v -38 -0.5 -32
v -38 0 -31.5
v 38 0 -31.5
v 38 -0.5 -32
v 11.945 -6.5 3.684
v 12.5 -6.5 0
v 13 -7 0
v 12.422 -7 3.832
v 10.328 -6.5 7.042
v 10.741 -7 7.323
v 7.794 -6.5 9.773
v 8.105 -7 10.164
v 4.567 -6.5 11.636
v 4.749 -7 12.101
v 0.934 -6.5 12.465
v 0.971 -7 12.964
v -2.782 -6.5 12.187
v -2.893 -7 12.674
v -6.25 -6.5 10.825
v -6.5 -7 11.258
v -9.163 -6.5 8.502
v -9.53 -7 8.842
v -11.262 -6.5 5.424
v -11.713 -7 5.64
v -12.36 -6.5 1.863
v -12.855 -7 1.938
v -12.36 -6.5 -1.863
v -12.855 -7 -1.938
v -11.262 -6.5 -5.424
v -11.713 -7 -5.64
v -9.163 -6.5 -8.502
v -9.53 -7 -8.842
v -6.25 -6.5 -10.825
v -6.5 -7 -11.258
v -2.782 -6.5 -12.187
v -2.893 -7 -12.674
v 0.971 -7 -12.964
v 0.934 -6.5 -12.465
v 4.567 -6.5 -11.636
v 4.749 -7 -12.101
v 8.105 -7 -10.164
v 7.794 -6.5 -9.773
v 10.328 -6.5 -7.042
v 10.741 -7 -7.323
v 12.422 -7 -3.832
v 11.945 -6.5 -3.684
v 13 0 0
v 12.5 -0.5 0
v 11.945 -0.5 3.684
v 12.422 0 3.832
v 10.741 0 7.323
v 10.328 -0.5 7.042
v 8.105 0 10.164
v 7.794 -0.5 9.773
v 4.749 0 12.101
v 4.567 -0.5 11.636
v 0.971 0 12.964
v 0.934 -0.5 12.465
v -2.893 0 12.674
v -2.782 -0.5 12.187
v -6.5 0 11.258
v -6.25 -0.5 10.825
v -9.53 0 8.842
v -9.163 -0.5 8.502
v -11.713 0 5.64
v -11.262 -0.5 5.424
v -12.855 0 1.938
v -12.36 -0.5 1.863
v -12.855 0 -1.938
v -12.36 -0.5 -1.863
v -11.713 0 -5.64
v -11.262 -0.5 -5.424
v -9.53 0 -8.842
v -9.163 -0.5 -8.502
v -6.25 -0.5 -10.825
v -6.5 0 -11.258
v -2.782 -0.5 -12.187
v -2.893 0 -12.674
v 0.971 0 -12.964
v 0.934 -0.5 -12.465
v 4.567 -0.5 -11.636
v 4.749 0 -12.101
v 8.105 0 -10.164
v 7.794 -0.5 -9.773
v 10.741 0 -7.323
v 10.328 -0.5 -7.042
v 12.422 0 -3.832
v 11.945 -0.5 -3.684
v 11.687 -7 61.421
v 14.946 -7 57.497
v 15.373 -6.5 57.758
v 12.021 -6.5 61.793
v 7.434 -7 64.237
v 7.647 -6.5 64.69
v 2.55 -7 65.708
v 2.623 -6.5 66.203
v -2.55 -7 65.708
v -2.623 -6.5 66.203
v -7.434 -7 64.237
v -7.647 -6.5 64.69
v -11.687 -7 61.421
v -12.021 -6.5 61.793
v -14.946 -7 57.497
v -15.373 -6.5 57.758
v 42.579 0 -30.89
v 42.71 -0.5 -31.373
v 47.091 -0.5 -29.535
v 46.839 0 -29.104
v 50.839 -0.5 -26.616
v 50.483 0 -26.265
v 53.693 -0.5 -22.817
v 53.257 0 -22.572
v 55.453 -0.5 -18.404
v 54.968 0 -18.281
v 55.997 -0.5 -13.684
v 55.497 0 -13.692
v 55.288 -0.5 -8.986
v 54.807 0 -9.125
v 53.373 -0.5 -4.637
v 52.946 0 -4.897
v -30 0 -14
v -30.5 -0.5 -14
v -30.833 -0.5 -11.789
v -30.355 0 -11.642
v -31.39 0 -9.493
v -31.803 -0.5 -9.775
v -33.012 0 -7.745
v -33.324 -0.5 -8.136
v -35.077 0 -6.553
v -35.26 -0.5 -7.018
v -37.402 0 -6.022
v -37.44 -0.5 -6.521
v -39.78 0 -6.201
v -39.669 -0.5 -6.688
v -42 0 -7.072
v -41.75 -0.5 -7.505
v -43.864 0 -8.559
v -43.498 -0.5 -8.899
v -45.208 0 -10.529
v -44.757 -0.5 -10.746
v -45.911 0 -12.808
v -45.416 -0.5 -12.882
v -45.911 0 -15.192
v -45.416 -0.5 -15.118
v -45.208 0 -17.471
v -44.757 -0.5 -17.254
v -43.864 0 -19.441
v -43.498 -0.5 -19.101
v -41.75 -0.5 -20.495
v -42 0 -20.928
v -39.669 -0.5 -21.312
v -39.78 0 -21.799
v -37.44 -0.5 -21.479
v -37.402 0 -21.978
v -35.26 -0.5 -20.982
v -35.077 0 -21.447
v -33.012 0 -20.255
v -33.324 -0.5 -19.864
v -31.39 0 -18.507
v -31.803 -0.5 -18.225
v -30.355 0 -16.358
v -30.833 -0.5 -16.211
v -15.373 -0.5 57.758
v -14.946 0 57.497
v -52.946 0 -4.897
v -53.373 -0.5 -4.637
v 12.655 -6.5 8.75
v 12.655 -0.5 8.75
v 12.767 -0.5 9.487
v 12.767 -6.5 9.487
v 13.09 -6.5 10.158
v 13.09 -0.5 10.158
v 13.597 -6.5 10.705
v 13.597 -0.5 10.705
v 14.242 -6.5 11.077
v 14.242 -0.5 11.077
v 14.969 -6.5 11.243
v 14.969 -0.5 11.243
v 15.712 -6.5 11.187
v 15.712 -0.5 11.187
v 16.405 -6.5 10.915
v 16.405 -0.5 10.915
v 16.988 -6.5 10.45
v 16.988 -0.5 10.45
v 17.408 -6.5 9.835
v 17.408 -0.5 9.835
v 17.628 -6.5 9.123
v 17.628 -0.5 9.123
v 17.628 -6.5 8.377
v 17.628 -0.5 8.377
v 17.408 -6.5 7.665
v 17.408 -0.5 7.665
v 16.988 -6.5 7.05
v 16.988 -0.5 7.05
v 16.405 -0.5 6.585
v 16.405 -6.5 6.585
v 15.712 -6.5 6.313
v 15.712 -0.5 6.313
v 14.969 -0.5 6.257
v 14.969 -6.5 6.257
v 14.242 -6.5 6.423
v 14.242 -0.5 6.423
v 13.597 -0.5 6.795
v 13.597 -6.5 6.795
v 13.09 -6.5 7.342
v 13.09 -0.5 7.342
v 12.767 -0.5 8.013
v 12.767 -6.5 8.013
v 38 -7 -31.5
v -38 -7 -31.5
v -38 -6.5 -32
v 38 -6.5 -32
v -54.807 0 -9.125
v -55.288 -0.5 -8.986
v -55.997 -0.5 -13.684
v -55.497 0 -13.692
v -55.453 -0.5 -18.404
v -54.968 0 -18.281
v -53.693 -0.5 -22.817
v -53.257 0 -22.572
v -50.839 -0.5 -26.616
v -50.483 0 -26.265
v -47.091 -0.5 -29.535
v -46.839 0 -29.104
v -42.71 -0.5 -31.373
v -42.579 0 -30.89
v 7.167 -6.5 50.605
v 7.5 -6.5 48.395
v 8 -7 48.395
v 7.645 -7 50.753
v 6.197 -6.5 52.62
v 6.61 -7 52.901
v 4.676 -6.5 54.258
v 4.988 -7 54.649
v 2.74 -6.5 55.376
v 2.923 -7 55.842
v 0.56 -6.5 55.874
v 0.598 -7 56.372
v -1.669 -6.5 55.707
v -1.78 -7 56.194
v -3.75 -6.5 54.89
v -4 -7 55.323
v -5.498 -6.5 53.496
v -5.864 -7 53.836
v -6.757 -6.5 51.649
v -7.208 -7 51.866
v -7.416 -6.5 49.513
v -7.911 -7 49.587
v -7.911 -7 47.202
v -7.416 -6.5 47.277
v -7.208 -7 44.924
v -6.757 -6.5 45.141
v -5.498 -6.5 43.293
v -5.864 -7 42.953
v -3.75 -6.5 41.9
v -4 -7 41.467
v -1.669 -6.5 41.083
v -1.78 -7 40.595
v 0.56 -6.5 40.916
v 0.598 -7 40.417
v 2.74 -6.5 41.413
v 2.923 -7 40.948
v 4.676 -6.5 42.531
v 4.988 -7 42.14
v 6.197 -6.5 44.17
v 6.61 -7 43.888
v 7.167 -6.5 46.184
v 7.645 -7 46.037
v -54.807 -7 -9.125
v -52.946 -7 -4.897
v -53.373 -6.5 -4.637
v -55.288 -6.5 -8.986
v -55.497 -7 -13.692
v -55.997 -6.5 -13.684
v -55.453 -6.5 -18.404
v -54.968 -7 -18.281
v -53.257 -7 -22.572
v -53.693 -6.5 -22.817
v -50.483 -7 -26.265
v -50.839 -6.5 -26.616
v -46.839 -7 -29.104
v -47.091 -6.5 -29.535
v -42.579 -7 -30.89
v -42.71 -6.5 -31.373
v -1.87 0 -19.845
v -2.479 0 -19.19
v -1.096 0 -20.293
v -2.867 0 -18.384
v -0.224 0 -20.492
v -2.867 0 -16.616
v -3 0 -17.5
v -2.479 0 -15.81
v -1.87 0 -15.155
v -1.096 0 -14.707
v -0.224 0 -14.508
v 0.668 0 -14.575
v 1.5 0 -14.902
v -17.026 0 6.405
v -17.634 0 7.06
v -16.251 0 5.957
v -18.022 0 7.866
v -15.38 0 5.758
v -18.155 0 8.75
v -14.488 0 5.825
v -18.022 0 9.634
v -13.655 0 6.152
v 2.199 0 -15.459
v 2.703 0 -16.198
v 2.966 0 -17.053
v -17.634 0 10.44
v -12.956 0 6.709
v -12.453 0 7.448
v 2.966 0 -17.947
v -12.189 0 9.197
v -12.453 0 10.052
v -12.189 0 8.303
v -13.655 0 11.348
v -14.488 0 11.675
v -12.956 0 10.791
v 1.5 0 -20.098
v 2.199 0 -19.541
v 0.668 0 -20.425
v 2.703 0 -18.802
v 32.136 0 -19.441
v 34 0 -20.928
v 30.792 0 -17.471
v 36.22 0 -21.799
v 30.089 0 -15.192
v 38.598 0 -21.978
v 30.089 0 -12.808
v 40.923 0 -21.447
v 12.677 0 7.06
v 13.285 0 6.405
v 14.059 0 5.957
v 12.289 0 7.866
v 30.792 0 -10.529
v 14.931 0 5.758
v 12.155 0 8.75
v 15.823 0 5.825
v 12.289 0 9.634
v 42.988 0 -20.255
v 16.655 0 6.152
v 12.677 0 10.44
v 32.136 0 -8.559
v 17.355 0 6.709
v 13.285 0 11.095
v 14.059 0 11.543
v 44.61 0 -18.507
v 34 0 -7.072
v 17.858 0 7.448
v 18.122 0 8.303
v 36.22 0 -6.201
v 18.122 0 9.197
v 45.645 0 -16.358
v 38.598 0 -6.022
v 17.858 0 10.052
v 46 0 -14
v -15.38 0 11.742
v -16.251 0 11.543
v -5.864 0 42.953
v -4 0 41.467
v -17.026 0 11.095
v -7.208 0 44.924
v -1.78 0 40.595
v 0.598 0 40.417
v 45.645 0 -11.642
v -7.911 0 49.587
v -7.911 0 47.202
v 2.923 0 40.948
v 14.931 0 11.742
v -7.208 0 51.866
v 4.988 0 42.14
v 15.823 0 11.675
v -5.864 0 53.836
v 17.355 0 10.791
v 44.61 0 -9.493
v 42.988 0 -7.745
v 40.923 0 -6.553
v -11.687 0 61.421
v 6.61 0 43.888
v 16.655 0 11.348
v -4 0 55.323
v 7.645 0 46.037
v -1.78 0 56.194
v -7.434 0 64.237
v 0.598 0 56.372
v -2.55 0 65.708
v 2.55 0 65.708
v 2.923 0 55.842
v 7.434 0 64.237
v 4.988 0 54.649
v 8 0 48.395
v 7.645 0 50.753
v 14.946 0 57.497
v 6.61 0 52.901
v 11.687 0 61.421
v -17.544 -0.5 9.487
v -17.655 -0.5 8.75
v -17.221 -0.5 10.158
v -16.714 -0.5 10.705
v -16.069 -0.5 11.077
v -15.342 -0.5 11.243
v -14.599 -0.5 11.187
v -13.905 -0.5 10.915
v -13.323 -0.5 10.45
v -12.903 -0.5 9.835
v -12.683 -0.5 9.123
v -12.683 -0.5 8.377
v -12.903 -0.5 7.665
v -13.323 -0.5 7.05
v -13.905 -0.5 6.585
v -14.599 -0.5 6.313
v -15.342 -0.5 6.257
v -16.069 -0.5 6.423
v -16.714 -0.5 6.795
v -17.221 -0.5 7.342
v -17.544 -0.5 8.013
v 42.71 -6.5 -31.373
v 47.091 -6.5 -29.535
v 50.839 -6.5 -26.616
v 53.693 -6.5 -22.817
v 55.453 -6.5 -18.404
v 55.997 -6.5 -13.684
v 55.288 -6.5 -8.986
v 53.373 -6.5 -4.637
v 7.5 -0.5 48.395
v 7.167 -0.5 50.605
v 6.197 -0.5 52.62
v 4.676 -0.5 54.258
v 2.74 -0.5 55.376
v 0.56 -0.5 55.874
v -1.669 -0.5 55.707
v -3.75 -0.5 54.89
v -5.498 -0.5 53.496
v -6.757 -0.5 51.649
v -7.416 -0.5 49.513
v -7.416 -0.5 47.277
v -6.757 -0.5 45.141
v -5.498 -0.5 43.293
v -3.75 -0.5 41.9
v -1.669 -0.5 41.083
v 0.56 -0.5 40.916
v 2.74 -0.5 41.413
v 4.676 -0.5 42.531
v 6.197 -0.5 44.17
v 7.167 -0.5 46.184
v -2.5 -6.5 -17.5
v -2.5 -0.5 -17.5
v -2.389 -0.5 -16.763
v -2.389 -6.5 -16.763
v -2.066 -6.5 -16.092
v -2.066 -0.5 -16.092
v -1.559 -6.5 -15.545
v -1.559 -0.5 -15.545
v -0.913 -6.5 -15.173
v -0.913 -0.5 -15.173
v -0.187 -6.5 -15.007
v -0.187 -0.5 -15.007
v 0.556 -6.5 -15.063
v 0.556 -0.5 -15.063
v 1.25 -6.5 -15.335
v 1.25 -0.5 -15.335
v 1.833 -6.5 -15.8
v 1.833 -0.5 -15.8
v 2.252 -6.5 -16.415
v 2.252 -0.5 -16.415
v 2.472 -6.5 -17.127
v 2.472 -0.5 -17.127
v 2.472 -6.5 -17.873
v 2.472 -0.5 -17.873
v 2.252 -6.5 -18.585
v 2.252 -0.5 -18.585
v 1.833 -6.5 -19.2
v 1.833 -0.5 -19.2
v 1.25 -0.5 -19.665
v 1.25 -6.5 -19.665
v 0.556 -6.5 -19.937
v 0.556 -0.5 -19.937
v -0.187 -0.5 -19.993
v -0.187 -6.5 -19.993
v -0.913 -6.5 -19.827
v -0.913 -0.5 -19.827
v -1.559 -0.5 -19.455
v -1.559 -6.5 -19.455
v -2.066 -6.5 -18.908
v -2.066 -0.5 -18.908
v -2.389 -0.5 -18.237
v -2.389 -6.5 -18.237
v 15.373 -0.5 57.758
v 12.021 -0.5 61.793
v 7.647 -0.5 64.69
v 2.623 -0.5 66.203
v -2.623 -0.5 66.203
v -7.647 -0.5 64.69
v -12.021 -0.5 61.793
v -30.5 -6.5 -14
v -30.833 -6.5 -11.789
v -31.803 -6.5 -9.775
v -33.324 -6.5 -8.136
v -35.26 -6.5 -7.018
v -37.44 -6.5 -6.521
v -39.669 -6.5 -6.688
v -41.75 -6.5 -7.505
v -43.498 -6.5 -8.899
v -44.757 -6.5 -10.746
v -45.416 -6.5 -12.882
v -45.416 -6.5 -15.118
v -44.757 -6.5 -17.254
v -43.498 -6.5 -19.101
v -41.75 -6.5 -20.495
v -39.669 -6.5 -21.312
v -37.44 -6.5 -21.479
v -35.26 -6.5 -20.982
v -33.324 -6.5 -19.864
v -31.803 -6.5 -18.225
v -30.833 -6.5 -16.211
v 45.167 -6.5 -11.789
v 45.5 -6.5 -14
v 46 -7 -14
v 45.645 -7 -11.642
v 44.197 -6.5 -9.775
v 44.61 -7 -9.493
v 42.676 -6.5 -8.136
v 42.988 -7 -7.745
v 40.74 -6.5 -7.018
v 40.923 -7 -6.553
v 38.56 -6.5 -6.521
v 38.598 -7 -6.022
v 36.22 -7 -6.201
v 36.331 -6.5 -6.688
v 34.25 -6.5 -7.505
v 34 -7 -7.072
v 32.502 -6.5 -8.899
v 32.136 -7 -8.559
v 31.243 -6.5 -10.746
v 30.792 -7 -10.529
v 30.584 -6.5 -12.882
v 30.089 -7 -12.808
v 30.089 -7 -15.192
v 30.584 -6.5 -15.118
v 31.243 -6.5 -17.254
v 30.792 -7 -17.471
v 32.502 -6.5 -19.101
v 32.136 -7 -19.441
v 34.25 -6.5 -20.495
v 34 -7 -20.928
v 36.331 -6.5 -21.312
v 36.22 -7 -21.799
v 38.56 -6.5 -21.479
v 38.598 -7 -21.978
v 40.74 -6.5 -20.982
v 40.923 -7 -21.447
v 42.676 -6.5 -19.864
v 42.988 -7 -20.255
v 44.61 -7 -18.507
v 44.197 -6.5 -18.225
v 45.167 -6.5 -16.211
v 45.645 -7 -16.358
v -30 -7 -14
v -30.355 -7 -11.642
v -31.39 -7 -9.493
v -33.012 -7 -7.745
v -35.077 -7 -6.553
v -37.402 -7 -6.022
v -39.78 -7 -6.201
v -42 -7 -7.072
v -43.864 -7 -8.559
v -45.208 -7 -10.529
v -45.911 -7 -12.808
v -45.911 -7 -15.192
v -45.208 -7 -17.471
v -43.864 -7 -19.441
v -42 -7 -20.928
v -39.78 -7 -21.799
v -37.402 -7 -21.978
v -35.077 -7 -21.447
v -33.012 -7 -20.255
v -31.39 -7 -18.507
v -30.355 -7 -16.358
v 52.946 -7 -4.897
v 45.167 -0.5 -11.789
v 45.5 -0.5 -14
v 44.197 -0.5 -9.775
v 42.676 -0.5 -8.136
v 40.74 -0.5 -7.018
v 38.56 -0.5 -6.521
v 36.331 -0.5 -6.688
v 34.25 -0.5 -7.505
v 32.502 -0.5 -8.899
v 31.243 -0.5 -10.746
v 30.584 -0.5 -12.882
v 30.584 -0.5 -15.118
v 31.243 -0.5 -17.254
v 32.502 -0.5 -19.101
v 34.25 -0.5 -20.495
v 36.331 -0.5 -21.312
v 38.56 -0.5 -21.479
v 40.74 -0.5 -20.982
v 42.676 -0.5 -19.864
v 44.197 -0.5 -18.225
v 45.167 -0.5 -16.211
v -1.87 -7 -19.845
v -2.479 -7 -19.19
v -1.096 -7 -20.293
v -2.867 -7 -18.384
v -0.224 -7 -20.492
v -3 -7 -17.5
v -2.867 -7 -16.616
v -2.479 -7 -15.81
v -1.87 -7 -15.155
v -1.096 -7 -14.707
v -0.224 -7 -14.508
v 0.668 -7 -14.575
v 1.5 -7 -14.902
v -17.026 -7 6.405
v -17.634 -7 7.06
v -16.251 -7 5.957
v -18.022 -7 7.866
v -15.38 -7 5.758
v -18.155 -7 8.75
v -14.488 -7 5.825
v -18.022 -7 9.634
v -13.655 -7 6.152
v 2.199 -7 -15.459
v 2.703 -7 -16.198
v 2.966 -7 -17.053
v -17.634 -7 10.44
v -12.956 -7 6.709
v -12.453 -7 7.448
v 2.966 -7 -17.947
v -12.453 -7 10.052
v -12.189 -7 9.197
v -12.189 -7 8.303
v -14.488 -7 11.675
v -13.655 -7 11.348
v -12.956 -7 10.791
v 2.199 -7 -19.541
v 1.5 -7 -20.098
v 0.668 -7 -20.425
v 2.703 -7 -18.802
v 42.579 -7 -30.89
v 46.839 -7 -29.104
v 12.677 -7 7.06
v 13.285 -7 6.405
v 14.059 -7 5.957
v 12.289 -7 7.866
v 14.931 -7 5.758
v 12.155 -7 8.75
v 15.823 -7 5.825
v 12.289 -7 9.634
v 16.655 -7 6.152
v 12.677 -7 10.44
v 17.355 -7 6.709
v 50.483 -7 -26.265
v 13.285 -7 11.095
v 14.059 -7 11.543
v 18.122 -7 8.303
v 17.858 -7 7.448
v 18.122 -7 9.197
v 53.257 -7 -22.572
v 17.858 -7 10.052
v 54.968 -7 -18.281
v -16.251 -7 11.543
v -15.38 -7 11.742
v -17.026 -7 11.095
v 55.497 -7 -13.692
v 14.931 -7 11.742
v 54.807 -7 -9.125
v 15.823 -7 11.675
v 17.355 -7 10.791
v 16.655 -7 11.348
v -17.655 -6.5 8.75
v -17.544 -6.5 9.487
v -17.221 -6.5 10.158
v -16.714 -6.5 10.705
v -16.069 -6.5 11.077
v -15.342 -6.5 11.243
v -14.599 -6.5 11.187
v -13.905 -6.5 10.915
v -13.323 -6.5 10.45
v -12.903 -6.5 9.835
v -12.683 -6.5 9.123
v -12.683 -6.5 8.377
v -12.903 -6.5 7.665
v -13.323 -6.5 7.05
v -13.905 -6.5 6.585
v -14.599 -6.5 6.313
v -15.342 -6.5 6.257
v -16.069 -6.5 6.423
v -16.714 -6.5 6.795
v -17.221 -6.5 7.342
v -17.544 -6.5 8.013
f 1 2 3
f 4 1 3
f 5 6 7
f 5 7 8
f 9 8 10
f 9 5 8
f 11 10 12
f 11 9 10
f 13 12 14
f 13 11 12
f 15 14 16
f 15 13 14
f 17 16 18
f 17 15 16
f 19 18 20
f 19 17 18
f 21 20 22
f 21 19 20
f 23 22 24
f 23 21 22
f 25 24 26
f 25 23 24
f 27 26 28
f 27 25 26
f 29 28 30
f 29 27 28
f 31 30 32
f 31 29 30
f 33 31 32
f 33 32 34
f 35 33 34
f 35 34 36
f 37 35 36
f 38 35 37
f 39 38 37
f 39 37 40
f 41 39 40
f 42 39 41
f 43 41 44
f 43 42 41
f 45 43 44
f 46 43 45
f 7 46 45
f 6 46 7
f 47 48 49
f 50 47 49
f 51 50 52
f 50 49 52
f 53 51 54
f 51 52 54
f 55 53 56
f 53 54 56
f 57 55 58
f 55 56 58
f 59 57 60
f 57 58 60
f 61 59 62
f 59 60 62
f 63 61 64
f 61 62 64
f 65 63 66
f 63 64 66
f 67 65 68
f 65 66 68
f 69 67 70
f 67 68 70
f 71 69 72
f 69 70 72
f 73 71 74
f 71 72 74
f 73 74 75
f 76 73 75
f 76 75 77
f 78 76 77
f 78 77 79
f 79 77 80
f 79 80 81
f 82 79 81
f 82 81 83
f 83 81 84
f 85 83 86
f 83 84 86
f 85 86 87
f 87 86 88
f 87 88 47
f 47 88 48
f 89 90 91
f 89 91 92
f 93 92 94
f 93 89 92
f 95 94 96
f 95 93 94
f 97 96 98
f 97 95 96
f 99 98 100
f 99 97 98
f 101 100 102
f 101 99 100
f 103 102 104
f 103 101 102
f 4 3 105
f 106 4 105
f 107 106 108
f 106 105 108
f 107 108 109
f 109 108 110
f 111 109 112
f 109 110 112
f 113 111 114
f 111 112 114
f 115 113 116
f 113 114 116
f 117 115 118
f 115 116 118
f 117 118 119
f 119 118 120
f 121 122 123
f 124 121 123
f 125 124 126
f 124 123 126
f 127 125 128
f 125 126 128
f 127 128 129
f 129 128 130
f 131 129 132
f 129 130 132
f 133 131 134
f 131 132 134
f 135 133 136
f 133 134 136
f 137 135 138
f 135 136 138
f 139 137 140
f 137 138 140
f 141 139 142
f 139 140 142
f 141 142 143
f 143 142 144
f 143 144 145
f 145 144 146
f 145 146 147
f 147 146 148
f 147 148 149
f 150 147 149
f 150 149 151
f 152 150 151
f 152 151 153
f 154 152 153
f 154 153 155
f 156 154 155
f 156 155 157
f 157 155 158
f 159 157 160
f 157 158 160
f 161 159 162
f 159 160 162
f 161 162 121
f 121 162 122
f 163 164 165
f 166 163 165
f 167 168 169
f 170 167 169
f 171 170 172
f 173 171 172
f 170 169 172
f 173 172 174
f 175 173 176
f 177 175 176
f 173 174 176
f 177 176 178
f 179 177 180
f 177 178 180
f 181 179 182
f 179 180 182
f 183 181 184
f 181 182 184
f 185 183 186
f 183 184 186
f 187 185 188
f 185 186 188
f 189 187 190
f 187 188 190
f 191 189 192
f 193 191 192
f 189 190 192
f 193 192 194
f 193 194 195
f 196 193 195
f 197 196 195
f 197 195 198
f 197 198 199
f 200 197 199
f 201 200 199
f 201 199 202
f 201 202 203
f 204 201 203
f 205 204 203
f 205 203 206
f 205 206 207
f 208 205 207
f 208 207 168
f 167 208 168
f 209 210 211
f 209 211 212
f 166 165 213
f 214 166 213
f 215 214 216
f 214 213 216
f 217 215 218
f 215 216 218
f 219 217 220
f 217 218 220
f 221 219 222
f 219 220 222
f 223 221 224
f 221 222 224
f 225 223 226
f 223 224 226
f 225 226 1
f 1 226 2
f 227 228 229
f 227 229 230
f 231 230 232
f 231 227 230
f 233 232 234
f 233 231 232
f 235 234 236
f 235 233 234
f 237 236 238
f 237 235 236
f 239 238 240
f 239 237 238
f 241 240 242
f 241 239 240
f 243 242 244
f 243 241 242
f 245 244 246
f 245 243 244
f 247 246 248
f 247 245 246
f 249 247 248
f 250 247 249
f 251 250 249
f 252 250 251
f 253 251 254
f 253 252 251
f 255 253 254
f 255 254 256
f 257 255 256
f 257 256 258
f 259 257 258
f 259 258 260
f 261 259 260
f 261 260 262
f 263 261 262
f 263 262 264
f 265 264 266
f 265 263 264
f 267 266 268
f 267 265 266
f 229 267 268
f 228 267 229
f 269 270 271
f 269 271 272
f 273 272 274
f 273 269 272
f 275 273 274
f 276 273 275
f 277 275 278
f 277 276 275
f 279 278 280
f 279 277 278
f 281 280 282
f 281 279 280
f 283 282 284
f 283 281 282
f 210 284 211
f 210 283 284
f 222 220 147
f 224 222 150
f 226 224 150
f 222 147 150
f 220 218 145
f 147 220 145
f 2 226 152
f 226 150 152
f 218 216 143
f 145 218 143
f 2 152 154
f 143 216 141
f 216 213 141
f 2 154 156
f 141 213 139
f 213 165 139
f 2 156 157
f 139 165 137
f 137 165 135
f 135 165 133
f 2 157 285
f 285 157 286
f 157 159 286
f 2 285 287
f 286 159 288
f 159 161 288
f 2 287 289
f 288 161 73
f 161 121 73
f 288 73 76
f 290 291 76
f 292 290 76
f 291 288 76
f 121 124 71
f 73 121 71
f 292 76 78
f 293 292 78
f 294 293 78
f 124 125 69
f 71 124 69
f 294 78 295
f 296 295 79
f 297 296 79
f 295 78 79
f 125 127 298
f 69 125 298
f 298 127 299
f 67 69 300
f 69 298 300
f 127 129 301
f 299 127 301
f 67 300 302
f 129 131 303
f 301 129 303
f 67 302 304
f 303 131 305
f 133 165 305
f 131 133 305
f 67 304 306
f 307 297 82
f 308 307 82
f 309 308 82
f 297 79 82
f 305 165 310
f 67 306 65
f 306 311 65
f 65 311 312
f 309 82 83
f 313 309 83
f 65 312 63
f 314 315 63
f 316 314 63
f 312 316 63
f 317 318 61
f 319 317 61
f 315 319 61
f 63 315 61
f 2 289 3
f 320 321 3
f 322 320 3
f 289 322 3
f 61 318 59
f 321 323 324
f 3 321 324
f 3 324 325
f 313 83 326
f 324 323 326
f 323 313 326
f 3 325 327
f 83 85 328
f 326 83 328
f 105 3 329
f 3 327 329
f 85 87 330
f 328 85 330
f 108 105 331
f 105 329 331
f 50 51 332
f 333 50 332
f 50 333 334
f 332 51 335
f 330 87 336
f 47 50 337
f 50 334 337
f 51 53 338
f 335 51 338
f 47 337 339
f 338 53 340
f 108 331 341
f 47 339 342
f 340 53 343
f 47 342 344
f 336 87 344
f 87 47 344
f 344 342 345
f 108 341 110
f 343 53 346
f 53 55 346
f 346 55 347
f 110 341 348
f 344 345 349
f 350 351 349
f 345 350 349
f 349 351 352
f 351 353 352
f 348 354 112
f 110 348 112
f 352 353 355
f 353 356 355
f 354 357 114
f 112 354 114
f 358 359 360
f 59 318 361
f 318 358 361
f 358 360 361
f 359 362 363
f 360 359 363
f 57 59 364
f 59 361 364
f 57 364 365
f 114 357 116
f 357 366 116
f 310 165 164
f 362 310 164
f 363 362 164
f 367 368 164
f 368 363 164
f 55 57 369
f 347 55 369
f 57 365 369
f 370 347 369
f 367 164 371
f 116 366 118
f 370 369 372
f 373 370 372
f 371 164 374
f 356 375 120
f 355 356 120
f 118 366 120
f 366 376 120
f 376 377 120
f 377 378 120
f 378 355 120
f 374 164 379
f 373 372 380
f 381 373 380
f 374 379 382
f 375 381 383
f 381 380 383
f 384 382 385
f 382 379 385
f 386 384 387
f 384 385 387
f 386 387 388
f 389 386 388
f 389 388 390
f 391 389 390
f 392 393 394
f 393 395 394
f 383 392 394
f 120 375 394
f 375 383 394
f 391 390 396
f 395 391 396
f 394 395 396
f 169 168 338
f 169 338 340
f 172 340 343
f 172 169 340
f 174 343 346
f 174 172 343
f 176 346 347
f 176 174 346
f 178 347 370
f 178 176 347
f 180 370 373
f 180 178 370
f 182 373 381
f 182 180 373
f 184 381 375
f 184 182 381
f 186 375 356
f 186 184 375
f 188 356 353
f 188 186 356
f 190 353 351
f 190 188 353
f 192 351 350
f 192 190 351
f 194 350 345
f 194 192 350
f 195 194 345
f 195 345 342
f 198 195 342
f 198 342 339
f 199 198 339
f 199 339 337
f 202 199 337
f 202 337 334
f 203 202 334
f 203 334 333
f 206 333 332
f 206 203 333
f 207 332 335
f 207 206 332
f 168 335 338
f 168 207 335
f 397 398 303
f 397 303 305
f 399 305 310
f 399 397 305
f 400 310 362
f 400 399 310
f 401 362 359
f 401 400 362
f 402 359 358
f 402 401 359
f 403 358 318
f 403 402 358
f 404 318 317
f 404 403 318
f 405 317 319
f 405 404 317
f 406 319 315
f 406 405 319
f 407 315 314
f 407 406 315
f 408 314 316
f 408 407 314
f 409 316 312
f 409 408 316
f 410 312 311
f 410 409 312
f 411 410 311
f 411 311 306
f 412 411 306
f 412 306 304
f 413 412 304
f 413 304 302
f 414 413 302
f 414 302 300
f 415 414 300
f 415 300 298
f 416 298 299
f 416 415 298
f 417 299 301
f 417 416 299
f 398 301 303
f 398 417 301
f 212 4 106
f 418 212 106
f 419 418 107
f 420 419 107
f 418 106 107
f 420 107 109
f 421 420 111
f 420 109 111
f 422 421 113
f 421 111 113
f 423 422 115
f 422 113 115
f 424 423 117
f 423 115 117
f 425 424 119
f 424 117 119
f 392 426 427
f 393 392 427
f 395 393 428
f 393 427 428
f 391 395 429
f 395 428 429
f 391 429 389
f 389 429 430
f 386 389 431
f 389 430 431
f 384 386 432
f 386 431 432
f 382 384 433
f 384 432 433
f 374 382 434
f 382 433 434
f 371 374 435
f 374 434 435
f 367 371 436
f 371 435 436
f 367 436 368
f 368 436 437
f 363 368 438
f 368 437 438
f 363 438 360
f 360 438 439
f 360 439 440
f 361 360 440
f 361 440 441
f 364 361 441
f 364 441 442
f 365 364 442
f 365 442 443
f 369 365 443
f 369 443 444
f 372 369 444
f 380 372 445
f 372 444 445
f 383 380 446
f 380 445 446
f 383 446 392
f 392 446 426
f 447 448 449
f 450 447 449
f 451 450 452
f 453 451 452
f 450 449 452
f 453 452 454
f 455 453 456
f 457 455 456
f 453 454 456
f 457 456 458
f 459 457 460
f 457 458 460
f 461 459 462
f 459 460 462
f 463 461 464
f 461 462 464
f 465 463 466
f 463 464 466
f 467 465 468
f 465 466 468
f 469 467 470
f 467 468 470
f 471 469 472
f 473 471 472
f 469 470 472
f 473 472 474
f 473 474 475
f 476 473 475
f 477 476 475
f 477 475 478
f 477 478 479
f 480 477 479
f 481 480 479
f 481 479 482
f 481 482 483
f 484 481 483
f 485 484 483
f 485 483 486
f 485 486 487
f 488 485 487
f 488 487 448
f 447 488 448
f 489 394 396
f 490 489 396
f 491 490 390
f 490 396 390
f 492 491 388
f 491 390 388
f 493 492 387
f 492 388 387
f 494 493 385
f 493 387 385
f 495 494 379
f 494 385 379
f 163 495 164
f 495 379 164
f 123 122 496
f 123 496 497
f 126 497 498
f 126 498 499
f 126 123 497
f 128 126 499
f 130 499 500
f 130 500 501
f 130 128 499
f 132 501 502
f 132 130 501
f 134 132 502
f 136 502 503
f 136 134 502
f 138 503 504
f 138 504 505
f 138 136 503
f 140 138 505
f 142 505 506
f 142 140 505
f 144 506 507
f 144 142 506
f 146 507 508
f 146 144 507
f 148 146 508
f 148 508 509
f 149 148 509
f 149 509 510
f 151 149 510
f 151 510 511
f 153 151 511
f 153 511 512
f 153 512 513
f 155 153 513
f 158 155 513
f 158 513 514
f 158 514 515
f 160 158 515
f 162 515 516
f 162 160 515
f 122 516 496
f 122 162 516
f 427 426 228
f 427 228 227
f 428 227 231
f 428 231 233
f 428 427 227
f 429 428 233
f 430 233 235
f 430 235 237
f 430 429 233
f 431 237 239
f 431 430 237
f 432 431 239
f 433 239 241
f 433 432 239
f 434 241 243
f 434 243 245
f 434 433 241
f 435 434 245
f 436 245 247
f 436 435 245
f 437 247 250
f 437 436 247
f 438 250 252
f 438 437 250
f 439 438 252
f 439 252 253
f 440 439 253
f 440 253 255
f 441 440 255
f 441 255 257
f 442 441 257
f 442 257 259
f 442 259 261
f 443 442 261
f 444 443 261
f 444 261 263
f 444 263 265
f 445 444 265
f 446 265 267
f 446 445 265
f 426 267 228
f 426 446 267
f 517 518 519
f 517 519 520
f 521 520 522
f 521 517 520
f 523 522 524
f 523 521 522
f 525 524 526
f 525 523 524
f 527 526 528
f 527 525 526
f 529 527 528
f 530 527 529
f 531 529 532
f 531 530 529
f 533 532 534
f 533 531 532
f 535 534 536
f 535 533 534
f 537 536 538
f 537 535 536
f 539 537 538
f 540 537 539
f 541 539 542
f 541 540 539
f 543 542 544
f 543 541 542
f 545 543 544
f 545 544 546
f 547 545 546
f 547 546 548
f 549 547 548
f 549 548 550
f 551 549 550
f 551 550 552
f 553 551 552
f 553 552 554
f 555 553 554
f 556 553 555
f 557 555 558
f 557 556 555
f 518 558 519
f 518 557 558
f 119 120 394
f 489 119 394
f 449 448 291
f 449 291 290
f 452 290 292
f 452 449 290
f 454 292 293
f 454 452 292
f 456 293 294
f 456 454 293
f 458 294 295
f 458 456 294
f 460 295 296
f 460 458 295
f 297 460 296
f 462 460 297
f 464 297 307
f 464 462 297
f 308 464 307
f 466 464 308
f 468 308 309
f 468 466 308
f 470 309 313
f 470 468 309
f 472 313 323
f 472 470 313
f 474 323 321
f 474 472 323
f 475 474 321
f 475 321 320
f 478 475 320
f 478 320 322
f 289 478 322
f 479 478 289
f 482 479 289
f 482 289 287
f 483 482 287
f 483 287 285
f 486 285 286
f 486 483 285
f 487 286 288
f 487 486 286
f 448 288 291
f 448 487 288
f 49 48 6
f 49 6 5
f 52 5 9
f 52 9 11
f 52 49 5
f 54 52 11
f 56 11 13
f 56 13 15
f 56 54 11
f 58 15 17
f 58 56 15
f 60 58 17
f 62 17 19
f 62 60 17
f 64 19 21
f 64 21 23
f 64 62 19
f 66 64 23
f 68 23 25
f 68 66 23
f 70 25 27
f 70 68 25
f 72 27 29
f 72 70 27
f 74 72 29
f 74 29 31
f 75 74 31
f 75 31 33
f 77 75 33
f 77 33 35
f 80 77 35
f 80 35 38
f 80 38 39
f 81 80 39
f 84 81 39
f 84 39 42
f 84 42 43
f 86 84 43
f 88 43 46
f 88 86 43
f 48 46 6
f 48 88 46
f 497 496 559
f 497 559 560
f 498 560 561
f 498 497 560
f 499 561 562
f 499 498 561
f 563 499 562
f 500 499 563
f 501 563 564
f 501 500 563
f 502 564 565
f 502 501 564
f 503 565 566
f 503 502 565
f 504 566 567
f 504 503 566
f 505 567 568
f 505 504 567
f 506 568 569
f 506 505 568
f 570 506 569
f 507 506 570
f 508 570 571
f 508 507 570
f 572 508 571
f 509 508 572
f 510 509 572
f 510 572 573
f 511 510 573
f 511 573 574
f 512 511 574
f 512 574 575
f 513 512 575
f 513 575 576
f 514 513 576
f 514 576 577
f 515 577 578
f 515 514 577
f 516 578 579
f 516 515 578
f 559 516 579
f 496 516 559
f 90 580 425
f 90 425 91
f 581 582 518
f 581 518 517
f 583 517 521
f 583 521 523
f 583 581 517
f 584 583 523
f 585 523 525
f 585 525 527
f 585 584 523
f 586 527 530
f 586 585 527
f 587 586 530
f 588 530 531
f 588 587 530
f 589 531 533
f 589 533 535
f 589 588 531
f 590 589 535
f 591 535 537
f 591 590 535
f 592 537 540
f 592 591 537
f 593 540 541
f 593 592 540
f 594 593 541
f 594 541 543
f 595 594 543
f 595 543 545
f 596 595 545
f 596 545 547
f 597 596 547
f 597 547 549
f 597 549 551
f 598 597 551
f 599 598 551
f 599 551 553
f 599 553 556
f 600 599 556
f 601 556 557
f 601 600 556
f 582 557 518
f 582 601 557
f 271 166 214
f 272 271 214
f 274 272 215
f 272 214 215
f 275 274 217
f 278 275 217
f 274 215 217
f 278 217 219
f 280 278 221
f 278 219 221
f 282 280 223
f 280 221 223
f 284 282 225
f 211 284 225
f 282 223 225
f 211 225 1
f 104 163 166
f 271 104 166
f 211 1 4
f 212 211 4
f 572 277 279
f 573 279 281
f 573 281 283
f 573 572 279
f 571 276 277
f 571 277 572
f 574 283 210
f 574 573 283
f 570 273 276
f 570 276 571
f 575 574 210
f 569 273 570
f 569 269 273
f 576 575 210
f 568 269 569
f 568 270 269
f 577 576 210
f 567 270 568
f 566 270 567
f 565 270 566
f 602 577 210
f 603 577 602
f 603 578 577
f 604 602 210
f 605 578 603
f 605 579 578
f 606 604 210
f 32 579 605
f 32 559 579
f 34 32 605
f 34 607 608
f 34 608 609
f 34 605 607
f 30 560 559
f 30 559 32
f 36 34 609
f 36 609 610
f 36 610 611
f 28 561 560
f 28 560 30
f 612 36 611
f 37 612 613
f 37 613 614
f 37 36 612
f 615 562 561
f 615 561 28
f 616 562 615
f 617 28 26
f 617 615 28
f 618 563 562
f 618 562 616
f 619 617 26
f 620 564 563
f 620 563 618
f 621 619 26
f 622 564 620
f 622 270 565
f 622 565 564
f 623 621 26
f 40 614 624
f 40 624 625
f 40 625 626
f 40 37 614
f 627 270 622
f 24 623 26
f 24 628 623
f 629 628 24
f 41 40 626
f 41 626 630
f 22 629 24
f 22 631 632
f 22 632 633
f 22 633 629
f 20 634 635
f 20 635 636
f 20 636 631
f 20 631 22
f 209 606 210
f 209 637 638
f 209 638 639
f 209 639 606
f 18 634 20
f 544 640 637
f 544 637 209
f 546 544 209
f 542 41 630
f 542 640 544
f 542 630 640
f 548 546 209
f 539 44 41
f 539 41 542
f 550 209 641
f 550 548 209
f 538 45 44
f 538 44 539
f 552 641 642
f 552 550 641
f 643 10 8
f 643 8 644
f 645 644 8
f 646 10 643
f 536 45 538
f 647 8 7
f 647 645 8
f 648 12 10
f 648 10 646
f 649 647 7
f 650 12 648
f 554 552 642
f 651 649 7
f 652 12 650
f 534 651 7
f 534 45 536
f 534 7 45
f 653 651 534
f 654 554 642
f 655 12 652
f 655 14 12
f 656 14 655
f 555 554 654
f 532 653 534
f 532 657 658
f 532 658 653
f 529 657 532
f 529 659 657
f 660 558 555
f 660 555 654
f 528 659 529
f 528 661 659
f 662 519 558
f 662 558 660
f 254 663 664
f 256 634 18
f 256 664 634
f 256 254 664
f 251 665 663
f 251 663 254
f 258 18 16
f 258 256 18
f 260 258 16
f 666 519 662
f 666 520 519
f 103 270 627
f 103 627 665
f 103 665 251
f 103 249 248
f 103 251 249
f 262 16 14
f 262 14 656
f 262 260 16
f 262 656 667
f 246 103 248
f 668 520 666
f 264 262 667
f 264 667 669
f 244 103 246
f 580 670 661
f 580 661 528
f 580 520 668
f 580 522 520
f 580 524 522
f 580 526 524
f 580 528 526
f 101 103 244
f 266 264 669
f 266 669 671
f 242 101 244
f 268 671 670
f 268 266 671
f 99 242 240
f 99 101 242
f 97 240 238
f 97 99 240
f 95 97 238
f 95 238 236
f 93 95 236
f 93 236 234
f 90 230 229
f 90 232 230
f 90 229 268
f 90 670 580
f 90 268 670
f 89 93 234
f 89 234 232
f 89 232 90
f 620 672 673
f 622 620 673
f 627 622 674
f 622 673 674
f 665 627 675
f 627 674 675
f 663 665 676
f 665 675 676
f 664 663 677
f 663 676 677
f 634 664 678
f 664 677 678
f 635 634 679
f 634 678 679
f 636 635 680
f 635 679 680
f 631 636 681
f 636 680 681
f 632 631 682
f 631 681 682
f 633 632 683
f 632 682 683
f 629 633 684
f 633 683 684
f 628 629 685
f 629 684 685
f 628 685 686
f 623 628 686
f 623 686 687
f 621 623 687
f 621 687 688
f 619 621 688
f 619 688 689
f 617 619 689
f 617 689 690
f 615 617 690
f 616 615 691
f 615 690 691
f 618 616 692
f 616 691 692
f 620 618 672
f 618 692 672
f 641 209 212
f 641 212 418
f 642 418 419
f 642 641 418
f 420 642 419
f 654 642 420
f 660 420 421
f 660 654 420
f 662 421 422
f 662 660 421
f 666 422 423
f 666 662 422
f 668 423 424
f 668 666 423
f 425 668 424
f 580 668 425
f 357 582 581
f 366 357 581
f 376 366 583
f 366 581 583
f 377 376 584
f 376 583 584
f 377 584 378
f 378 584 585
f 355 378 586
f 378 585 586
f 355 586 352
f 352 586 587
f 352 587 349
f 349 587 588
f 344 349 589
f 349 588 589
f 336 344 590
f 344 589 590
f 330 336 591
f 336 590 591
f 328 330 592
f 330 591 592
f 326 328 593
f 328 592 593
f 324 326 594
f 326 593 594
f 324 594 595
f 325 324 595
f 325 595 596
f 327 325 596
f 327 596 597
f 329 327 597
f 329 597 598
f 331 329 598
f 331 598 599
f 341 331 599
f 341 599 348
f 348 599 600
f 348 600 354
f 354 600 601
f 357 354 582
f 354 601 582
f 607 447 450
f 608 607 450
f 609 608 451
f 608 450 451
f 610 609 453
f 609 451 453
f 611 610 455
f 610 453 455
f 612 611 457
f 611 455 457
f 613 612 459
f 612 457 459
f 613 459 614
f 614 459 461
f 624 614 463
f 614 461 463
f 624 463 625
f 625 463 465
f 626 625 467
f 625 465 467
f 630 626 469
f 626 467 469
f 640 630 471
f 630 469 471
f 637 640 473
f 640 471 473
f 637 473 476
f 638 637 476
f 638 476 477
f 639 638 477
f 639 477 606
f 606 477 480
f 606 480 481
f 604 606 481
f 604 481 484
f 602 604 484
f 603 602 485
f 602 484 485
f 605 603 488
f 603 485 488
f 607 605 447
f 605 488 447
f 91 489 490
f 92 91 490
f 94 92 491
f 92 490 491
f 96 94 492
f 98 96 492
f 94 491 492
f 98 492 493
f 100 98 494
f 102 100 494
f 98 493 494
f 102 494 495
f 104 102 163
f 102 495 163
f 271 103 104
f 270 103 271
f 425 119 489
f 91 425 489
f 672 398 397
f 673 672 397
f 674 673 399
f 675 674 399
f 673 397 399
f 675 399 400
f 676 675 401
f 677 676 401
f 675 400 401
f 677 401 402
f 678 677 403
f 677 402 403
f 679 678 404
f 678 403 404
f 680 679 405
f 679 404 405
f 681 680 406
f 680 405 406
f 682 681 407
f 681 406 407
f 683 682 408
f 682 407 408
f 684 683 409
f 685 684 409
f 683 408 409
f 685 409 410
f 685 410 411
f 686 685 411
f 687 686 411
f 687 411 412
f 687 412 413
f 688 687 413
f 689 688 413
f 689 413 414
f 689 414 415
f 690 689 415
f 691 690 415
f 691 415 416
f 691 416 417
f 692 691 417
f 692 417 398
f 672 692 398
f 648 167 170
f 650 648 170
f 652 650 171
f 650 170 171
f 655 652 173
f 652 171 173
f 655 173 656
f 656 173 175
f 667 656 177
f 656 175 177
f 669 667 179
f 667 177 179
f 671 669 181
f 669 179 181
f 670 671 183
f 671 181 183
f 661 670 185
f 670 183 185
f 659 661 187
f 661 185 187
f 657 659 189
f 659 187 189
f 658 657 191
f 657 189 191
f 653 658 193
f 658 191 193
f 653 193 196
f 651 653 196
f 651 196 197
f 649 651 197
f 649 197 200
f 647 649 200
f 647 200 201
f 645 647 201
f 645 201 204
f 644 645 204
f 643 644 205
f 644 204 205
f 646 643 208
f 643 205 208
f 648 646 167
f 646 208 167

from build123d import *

# Parameters (mm, degrees)
F0_R     = 7.5
F0_R_2   = 12.5
F1_DEPTH = 7
F3_D     = 5
F4_SIZE  = 0.5


with BuildPart() as f1:
    # F0 (on Front) → F1 (new body)
    with BuildSketch(Plane.XZ):
        with BuildLine():
            ThreePointArc((-53.3733215365, -4.6372554806), (-53.6928232219, -22.8167624061), (-38, -32))
            Line((-38, -32), (38, -32))
            ThreePointArc((38, -32), (53.6928232219, -22.8167624061), (53.3733215365, -4.6372554806))
            Line((53.3733215365, -4.6372554806), (15.3733215365, 57.7575067788))
            ThreePointArc((15.3733215365, 57.7575067788), (0, 66.3947622594), (-15.3733215365, 57.7575067788))
            Line((-15.3733215365, 57.7575067788), (-53.3733215365, -4.6372554806))
        make_face()
        with Locations((-38, -14)):
            Circle(F0_R, mode=Mode.SUBTRACT)
        with Locations((38, -14)):
            Circle(F0_R, mode=Mode.SUBTRACT)
        Circle(F0_R_2, mode=Mode.SUBTRACT)
        with Locations((0, 48.3947622594)):
            Circle(F0_R, mode=Mode.SUBTRACT)
    extrude(amount=F1_DEPTH)

    # F3 (through all)
    with Locations(Plane.XZ.offset(7)):
        with Locations((-15.1554445662, 8.75), (15.1554445662, 8.75), (0, -17.5)):
            Hole(F3_D / 2)

    # F4
    f4_edges = [f1.edges().sort_by_distance(p)[0] for p in [
        (-53.692823, -7, -22.816762),
        (-34.373322, -7, 26.560126),
        (0, -7, -32),
        (0, -7, 66.394762),
        (53.692823, -7, -22.816762),
        (34.373322, -7, 26.560126),
        (-45.5, -7, -14),
        (-17.655445, -7, 8.75),
        (-2.5, -7, -17.5),
        (30.5, -7, -14),
        (-12.5, -7, 0),
        (12.655445, -7, 8.75),
        (-7.5, -7, 48.394762),
        (-53.692823, 0, -22.816762),
        (-34.373322, 0, 26.560126),
        (0, 0, -32),
        (0, 0, 66.394762),
        (53.692823, 0, -22.816762),
        (34.373322, 0, 26.560126),
        (-45.5, 0, -14),
        (-17.655445, 0, 8.75),
        (-2.5, 0, -17.5),
        (30.5, 0, -14),
        (-12.5, 0, 0),
        (12.655445, 0, 8.75),
        (-7.5, 0, 48.394762),
    ]]
    chamfer(f4_edges, length=F4_SIZE)


solid = f1.part
